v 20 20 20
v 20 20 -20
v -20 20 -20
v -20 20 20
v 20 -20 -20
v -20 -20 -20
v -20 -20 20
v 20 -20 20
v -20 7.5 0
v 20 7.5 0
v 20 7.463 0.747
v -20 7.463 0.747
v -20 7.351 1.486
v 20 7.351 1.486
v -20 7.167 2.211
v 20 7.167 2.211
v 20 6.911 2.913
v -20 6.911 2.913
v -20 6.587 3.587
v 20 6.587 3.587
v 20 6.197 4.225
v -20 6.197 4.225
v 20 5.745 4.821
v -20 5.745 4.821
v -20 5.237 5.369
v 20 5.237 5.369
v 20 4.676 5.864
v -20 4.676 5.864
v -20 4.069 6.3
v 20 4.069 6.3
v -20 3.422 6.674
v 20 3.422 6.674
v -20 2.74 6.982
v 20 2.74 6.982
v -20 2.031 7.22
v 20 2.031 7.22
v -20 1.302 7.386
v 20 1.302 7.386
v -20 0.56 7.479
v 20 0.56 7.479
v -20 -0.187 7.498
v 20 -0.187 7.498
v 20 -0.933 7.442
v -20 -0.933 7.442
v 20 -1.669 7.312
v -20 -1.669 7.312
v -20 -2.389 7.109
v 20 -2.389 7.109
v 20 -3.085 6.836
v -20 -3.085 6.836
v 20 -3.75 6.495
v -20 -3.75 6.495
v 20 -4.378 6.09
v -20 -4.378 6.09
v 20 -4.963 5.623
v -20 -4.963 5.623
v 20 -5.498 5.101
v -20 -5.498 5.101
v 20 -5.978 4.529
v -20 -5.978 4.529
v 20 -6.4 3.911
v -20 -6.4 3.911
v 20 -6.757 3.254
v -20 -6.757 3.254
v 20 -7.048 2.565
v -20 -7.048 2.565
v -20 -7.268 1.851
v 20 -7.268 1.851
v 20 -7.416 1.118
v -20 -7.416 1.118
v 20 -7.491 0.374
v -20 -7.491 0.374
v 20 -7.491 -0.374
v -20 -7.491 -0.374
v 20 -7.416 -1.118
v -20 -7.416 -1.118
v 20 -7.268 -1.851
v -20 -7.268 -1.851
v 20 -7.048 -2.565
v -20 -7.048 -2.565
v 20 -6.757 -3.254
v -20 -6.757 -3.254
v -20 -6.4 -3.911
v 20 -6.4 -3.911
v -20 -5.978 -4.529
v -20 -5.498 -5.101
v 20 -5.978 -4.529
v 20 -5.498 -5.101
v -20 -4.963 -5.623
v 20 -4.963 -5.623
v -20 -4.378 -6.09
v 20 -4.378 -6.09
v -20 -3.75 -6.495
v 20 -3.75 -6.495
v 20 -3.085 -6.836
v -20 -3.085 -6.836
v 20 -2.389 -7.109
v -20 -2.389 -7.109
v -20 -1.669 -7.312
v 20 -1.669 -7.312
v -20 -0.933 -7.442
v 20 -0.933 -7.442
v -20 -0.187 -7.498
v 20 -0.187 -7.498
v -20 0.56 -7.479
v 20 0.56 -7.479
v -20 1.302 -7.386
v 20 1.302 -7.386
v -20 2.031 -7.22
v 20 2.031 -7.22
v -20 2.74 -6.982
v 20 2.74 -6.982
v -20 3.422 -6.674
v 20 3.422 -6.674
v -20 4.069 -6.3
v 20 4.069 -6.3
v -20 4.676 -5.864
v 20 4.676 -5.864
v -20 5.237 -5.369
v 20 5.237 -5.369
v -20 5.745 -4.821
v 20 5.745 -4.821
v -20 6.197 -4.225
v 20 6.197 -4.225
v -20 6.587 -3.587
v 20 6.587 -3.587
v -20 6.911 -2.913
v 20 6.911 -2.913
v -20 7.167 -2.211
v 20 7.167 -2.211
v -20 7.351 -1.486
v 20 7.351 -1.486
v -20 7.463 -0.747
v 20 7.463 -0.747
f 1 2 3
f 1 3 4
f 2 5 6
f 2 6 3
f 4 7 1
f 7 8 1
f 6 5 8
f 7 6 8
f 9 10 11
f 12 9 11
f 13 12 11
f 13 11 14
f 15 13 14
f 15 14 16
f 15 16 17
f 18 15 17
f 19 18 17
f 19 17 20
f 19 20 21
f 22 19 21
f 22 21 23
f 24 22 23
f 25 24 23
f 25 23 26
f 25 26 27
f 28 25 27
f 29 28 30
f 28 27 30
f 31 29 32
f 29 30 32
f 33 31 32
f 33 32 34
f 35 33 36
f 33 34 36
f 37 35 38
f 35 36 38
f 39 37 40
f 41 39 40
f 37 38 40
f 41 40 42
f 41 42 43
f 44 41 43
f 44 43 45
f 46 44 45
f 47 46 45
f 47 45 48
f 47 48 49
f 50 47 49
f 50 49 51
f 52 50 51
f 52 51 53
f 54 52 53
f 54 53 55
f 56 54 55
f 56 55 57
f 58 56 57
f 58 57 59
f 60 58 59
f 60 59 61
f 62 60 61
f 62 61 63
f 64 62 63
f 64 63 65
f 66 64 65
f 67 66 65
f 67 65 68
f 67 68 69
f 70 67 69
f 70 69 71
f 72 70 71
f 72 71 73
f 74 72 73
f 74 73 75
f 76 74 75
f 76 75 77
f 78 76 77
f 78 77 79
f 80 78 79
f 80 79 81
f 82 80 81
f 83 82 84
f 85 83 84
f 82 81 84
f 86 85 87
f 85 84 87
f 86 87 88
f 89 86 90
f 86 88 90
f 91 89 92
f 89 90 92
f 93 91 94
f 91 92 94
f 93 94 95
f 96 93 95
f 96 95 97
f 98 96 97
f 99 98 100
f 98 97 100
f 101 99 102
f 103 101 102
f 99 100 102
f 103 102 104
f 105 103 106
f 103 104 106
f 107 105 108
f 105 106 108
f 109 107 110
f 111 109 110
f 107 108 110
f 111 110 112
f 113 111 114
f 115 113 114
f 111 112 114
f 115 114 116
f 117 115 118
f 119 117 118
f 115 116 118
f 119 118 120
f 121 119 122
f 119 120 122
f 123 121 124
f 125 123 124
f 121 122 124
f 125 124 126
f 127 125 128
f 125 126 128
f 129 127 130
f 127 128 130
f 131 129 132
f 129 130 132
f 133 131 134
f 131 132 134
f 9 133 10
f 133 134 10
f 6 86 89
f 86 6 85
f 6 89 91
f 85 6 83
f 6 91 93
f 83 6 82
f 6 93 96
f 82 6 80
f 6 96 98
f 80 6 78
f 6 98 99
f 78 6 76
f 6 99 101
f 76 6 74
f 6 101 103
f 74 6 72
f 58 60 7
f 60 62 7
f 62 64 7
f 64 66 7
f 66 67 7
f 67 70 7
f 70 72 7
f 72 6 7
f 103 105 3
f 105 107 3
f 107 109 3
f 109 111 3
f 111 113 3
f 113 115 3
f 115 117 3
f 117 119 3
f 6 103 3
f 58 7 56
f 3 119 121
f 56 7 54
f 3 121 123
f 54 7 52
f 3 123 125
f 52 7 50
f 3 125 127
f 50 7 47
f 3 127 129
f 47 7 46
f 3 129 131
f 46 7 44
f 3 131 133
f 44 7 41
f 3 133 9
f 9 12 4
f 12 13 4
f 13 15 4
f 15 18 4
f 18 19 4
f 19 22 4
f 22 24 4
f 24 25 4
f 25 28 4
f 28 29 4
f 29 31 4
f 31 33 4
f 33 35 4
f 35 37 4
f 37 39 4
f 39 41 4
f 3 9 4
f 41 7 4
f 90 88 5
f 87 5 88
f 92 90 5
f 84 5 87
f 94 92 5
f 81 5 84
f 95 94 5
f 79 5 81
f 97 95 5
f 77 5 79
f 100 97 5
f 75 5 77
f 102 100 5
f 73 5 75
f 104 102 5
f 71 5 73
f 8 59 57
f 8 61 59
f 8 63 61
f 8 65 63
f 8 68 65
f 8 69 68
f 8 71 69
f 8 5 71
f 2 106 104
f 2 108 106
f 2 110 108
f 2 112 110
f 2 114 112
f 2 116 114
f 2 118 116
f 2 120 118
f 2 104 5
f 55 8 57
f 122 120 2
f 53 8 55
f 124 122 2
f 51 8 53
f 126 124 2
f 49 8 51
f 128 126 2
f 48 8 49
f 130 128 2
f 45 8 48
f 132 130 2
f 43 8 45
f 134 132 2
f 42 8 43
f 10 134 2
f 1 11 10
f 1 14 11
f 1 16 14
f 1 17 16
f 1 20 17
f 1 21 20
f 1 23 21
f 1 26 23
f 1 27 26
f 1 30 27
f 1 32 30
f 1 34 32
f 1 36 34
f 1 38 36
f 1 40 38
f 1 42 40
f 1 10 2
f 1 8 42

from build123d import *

# Parameters (mm, degrees)
F0_W     = 40
F0_H     = 40
F1_DEPTH = 20
F2_R     = 7.5
F3_DEPTH = 40.001


with BuildPart() as f1:
    # F0 (on Right) → F1 (new body, symmetric)
    with BuildSketch(Plane.YZ):
        Rectangle(F0_W, F0_H)
    extrude(amount=F1_DEPTH, both=True)

    # F2 (on face) → F3 (cut, through all)
    with BuildSketch(Plane.YZ.offset(20)):
        Circle(F2_R)
    extrude(amount=-F3_DEPTH, mode=Mode.SUBTRACT)


solid = f1.part
